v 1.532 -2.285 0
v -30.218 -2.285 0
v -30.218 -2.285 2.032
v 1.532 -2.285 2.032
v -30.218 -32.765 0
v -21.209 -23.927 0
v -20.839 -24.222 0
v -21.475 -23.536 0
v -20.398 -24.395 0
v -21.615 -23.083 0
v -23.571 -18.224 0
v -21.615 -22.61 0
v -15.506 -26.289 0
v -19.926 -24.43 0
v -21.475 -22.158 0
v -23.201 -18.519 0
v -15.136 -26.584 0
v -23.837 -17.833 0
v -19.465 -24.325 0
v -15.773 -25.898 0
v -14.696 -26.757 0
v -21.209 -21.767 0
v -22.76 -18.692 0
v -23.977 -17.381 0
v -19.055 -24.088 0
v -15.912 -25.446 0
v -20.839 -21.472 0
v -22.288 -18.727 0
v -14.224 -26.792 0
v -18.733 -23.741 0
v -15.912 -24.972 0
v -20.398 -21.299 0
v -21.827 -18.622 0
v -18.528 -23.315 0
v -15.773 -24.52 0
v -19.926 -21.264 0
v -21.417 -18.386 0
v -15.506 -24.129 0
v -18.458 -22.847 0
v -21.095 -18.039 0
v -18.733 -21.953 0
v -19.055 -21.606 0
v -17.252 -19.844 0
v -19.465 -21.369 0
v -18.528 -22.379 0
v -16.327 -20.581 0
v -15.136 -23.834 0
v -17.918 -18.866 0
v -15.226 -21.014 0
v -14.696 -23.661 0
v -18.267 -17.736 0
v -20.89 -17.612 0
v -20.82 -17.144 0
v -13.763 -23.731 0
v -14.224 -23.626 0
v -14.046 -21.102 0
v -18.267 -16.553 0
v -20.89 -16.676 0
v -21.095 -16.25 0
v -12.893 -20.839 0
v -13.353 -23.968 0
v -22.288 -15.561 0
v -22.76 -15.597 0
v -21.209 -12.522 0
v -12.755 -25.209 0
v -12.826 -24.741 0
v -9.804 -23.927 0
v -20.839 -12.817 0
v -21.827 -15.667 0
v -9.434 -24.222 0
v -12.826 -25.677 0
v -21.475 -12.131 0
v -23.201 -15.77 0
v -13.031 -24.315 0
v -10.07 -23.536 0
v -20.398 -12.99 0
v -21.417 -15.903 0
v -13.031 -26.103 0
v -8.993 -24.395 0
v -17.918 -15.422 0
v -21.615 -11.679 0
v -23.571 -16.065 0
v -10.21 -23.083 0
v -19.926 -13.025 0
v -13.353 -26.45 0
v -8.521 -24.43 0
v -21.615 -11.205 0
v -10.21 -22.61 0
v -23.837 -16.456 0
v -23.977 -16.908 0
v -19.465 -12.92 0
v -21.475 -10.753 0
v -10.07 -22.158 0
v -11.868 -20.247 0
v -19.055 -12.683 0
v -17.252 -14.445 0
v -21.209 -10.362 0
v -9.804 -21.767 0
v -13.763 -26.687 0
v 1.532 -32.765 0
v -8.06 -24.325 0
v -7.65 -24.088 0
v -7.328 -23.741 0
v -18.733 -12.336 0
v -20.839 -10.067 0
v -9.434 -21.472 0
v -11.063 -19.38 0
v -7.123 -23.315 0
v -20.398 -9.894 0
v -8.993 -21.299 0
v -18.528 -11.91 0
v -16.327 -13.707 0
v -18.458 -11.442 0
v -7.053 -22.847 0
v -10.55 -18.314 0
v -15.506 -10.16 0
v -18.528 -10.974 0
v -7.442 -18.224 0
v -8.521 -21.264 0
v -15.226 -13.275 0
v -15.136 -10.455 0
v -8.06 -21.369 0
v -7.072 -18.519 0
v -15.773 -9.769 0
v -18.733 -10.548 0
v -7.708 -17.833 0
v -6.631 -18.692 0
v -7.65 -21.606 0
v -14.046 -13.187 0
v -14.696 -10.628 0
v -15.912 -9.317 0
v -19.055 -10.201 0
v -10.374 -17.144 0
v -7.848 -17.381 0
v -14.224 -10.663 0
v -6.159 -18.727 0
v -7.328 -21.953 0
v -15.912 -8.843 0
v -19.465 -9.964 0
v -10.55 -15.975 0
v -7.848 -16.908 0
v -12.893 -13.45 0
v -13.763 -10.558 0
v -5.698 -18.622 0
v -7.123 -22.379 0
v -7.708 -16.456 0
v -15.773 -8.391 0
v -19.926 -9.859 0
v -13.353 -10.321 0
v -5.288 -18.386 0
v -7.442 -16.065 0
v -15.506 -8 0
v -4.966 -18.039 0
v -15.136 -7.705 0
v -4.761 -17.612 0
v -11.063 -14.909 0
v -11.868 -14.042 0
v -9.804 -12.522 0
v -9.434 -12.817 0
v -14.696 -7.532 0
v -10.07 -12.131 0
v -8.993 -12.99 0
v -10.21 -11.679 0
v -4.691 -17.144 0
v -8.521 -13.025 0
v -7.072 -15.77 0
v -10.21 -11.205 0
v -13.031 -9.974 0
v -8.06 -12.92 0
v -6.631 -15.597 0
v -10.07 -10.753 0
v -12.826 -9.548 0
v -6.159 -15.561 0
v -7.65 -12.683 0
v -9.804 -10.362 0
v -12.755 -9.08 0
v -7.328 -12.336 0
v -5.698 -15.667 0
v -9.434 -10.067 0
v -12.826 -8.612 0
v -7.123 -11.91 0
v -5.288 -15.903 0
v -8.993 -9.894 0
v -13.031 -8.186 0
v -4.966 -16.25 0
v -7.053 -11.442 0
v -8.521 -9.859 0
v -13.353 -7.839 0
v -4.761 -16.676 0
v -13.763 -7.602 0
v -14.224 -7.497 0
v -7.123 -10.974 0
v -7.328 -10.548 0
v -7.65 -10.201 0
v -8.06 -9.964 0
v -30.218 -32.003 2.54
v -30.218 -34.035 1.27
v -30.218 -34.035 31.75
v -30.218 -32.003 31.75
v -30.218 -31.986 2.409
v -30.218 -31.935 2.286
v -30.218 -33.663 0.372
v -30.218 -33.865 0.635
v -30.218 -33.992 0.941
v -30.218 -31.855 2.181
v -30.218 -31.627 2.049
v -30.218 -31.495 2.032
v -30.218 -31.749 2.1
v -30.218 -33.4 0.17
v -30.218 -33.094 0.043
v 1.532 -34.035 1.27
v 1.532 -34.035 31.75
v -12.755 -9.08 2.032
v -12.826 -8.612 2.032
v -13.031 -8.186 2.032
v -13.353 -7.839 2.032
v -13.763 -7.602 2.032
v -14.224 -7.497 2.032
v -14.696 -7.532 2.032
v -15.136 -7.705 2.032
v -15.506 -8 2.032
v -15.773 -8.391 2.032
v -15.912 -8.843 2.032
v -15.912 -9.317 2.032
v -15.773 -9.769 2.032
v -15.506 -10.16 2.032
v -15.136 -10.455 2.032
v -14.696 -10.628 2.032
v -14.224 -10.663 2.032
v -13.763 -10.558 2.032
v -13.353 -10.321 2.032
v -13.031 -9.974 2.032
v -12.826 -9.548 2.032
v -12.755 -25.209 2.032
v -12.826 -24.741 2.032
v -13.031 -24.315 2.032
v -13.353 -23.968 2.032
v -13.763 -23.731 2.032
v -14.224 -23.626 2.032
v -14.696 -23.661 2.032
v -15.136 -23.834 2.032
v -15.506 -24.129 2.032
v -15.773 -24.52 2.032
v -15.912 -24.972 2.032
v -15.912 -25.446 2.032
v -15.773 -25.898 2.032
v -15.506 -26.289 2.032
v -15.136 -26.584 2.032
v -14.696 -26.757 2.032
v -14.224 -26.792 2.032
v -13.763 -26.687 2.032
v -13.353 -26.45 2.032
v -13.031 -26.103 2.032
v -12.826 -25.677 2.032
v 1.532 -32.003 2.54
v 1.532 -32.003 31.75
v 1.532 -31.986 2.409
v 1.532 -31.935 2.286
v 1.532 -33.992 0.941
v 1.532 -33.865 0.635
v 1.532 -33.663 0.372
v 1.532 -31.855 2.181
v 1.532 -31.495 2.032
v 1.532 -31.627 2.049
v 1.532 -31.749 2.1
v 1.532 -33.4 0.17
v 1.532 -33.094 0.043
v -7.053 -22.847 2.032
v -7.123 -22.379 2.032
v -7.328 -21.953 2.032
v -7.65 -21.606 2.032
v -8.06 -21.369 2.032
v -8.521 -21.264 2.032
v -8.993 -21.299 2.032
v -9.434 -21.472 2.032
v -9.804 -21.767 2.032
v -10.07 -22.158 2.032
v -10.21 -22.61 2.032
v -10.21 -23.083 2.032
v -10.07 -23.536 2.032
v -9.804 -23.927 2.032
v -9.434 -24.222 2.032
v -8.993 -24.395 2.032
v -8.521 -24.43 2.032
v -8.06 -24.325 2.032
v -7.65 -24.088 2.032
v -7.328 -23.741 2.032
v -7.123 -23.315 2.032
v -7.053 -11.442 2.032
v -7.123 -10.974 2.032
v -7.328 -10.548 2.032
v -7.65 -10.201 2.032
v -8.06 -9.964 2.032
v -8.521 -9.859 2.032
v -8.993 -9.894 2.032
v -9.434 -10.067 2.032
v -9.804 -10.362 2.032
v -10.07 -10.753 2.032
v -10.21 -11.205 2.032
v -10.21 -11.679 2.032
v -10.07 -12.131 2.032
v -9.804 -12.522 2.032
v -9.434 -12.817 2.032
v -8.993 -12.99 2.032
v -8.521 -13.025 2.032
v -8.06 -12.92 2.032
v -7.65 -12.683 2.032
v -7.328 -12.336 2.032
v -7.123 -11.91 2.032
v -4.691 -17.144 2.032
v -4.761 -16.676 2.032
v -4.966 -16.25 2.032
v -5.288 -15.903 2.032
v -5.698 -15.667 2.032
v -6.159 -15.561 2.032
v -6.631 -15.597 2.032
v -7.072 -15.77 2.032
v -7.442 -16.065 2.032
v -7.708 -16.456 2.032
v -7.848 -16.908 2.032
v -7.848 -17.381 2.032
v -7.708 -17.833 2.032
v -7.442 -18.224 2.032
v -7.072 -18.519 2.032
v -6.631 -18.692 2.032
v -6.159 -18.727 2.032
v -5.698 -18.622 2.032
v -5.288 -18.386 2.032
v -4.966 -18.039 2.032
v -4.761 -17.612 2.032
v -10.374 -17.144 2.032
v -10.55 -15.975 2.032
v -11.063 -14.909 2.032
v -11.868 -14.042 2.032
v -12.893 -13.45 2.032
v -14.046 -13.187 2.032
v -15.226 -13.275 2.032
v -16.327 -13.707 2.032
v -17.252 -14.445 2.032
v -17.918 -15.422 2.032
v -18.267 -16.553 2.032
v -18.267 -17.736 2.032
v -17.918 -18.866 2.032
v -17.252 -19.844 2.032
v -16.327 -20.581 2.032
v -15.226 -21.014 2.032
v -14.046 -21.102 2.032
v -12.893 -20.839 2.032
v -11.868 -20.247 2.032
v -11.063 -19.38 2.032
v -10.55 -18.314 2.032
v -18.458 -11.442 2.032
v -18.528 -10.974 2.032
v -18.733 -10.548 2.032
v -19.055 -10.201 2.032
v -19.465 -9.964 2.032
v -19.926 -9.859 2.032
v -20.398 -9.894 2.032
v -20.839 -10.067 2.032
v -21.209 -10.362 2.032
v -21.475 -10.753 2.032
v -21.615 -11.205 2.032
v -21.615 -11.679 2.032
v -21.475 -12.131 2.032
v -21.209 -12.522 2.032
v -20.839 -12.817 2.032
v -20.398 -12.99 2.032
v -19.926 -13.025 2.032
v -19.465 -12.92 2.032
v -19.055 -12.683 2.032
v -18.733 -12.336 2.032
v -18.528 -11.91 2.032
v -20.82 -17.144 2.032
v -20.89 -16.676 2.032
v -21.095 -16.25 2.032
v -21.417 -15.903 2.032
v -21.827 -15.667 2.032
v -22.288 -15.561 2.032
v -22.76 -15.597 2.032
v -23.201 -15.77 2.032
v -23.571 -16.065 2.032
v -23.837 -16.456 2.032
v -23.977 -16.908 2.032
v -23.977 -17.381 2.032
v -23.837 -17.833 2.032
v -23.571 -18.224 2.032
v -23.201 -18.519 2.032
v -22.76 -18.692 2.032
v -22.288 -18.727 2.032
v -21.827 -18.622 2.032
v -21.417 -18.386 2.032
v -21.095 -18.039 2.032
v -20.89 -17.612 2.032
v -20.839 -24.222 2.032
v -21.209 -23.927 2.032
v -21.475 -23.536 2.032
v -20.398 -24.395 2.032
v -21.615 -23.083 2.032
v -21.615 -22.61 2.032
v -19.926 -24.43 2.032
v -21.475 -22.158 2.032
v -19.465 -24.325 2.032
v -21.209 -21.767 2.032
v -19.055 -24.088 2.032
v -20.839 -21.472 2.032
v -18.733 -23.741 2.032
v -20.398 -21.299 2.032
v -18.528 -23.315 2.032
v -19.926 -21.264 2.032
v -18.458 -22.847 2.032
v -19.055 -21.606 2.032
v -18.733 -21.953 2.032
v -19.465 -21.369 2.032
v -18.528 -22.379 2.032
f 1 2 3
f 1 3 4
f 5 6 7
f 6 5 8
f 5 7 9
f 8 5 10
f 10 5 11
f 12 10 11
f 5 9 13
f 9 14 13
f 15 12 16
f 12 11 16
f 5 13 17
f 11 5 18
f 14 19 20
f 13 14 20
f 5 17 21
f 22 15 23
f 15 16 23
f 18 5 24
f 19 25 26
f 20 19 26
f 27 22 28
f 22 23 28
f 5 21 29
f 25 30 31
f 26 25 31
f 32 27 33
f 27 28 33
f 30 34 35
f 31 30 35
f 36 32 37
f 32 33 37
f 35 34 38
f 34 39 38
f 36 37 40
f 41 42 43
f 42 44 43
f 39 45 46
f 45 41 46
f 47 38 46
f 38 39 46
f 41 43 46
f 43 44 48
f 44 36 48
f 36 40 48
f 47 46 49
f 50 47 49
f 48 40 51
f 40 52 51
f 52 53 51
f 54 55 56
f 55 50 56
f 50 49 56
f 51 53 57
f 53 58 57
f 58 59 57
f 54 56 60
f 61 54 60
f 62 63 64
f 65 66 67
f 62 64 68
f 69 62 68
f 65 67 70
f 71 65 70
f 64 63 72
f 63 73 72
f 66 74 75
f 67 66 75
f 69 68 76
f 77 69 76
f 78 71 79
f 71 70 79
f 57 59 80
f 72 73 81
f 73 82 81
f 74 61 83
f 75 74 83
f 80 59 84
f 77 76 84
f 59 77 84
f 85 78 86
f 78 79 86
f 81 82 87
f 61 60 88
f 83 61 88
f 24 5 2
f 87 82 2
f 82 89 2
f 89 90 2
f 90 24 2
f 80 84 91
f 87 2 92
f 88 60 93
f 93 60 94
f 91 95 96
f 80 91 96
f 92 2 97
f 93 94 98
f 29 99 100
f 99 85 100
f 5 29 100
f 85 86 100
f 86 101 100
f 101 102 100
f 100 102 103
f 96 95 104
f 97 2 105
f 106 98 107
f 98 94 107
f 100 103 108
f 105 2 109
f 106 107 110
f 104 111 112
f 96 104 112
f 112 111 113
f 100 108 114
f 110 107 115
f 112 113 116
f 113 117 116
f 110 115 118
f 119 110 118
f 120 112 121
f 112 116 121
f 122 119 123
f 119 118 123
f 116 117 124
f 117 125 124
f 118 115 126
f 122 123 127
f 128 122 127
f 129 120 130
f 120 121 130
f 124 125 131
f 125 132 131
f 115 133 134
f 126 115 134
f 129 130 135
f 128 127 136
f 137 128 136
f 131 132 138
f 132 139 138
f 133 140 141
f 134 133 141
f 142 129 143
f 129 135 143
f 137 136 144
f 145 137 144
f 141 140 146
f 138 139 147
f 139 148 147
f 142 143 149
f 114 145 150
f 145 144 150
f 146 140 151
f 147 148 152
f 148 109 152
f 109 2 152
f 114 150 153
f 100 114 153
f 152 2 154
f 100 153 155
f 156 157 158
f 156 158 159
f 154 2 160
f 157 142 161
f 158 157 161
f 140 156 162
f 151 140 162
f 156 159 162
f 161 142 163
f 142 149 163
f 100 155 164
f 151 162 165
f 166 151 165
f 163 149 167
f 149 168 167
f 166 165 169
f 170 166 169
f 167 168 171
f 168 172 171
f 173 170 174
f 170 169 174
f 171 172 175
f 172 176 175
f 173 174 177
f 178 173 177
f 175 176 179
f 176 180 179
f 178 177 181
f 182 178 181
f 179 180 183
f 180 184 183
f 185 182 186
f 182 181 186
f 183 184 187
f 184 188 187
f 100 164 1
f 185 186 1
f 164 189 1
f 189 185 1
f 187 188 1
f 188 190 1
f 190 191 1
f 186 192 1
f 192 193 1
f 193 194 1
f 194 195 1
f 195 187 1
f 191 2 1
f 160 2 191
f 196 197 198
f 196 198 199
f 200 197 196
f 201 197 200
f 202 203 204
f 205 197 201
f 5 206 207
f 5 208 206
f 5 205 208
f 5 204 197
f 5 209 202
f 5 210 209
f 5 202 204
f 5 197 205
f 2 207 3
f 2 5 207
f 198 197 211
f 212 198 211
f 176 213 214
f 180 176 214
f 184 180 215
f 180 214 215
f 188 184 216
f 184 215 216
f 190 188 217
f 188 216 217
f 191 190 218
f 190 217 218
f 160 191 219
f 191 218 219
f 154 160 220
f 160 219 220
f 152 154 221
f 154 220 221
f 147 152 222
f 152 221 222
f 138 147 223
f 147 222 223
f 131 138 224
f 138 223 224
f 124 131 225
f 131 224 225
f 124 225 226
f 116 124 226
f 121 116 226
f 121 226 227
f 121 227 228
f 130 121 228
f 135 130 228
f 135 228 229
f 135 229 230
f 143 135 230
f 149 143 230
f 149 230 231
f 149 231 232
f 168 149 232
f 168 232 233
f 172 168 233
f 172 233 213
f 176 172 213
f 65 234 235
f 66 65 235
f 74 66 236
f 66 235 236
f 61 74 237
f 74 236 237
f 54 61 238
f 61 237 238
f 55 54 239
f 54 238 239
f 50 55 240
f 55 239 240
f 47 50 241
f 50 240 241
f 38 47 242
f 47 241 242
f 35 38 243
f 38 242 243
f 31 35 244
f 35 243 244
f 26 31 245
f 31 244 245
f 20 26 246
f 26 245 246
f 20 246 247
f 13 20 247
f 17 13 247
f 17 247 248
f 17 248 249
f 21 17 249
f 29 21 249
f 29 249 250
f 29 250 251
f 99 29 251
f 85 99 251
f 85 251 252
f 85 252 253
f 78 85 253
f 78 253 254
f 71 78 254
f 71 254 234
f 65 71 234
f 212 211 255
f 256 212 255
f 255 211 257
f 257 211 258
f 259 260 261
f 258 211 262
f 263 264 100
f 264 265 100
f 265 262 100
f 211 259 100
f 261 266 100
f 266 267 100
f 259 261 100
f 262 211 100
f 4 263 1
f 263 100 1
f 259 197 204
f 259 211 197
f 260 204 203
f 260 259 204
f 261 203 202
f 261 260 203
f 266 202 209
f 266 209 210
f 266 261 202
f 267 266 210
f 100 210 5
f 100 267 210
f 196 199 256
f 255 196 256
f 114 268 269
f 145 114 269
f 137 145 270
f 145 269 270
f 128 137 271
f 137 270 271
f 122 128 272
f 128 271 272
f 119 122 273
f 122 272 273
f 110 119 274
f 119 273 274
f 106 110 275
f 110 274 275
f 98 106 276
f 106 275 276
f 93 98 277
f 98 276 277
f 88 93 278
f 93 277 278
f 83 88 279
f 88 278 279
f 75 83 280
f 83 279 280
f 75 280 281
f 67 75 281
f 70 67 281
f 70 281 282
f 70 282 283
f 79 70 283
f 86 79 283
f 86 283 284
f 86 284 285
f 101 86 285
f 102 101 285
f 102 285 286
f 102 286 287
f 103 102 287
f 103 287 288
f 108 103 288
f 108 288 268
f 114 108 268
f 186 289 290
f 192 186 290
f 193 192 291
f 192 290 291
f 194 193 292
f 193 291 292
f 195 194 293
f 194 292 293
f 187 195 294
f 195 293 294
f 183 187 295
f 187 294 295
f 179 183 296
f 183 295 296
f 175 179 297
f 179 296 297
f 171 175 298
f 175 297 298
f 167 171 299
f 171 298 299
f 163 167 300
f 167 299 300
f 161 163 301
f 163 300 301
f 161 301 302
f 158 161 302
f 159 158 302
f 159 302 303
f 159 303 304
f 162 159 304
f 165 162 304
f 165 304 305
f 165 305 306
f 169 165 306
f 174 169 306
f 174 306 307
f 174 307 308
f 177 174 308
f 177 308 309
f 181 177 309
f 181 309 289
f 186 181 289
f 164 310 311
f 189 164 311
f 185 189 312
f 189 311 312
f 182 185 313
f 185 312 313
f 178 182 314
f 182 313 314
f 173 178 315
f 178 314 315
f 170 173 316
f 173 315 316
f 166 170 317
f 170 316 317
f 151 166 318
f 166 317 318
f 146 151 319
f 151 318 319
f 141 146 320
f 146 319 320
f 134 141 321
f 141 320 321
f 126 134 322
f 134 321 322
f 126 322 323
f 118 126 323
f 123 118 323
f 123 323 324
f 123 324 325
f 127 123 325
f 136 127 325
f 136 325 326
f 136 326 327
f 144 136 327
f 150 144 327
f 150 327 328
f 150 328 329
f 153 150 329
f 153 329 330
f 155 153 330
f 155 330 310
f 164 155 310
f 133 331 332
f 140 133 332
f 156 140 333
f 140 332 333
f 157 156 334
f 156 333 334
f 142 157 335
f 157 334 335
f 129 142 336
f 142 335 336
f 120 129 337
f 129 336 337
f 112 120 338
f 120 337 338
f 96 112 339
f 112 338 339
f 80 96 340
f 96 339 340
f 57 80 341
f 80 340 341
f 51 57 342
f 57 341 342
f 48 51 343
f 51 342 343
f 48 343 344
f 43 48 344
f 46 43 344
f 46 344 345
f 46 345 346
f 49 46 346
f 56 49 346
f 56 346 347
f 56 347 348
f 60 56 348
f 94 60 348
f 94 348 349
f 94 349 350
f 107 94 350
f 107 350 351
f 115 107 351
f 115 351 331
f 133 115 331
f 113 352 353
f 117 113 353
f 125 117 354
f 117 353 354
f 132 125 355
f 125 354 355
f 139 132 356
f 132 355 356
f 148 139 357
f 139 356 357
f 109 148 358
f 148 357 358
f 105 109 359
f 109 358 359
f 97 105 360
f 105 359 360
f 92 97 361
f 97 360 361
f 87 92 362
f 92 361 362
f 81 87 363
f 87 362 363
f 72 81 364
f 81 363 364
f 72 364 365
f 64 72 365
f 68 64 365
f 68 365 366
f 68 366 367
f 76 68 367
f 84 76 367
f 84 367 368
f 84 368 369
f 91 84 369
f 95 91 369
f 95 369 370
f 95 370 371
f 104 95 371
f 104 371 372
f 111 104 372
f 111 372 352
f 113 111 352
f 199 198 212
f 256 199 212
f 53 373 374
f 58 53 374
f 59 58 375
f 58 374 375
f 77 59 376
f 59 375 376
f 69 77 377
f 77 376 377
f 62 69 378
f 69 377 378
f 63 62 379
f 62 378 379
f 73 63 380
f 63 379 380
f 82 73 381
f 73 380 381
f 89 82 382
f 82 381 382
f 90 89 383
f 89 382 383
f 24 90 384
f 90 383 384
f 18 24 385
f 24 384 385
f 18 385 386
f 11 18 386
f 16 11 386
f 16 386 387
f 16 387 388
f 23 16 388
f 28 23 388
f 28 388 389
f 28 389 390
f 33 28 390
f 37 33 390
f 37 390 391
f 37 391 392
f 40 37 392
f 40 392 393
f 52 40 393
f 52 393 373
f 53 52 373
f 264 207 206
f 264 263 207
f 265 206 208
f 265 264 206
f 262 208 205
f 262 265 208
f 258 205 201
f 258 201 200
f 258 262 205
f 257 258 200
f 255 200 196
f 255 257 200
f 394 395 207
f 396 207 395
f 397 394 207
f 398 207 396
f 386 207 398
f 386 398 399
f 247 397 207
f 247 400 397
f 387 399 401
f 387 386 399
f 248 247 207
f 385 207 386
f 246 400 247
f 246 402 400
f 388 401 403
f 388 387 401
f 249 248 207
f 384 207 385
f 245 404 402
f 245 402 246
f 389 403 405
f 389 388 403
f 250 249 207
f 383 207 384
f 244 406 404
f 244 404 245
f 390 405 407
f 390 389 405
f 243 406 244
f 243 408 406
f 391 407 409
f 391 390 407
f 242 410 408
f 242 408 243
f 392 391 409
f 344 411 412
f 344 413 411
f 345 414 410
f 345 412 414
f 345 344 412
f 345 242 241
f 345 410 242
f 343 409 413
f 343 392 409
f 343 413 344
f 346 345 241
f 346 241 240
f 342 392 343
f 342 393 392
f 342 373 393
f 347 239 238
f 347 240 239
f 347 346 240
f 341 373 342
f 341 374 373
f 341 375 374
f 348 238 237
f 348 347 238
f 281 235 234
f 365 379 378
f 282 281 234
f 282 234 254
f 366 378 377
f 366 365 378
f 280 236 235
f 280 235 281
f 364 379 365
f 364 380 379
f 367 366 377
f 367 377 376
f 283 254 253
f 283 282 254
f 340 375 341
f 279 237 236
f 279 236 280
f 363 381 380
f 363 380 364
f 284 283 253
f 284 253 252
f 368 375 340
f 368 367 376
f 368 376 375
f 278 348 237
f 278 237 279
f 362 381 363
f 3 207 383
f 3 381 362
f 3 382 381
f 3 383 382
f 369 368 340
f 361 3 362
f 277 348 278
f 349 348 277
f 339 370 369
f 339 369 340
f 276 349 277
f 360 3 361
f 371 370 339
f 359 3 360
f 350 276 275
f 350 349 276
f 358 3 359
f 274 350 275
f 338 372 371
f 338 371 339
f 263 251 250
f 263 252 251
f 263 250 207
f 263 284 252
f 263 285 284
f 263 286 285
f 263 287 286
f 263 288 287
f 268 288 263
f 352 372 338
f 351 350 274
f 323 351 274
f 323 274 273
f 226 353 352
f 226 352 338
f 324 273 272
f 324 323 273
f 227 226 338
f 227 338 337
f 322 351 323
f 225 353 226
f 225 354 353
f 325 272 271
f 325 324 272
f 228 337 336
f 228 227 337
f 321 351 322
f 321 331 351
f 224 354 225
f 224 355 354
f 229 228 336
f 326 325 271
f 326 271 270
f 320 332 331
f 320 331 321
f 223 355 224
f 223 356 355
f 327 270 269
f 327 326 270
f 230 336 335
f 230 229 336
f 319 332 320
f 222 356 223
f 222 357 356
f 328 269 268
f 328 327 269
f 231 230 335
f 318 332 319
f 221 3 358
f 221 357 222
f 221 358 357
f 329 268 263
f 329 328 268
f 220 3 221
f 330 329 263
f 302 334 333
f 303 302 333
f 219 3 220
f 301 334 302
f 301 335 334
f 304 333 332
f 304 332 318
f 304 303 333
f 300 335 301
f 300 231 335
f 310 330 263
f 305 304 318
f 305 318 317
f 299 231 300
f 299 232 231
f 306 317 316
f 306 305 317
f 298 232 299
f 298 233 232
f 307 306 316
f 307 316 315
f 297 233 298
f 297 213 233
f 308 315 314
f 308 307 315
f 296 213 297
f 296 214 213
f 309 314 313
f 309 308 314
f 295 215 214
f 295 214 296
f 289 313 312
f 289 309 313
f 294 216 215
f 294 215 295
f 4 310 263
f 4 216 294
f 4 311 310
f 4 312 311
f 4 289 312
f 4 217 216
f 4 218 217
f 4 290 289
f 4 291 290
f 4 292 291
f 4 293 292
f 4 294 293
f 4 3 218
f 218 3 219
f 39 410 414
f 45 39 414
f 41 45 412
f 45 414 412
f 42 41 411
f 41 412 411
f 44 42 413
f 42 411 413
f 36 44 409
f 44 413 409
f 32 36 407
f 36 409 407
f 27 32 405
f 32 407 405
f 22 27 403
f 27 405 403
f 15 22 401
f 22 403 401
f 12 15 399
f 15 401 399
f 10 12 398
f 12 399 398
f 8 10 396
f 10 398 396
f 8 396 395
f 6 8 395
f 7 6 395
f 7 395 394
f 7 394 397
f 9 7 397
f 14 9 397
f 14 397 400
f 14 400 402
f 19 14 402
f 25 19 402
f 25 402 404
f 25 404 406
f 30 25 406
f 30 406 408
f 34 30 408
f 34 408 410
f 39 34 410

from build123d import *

# Parameters (mm, degrees)
F0_W     = 31.75
F0_H     = 31.75
F1_DEPTH = 2.032
F2_W     = 31.75
F2_H     = 31.75
F3_DEPTH = 2.032
F4_R     = 0.508
F5_R     = 1.27
F6_R     = 1.5875
F6_R_2   = 3.96875
F7_DEPTH = 25.4


with BuildPart() as f1:
    # F0 (on Top) → F1 (new body)
    with BuildSketch(Plane.XY):
        with Locations((-14.342583, -18.160402)):
            Rectangle(F0_W, F0_H)
    extrude(amount=F1_DEPTH)

    # F2 (on face) → F3 (join)
    with BuildSketch(Plane.XZ.offset(34.035402)):
        with Locations((-14.342583, 15.875)):
            Rectangle(F2_W, F2_H)
    extrude(amount=-F3_DEPTH)

    # F4
    f4_edges = [f1.edges().sort_by_distance(p)[0] for p in [
        (-14.342583, -32.003402, 2.032),
    ]]
    fillet(f4_edges, radius=F4_R)

    # F5
    f5_edges = [f1.edges().sort_by_distance(p)[0] for p in [
        (-14.342583, -34.035402, 0),
    ]]
    fillet(f5_edges, radius=F5_R)

    # F6 (on face) → F7 (cut)
    with BuildSketch(Plane.XY.offset(2.032)):
        with Locations((-14.342583, -9.079902)):
            Circle(F6_R)
        with Locations((-20.045045, -11.441939)):
            Circle(F6_R)
        with Locations((-22.407083, -17.144402)):
            Circle(F6_R)
        with Locations((-20.045045, -22.846864)):
            Circle(F6_R)
        with Locations((-14.342583, -25.208902)):
            Circle(F6_R)
        with Locations((-8.64012, -22.846864)):
            Circle(F6_R)
        with Locations((-6.278083, -17.144402)):
            Circle(F6_R)
        with Locations((-8.64012, -11.441939)):
            Circle(F6_R)
        with Locations((-14.342583, -17.144402)):
            Circle(F6_R_2)
    extrude(amount=-F7_DEPTH, mode=Mode.SUBTRACT)


solid = f1.part
